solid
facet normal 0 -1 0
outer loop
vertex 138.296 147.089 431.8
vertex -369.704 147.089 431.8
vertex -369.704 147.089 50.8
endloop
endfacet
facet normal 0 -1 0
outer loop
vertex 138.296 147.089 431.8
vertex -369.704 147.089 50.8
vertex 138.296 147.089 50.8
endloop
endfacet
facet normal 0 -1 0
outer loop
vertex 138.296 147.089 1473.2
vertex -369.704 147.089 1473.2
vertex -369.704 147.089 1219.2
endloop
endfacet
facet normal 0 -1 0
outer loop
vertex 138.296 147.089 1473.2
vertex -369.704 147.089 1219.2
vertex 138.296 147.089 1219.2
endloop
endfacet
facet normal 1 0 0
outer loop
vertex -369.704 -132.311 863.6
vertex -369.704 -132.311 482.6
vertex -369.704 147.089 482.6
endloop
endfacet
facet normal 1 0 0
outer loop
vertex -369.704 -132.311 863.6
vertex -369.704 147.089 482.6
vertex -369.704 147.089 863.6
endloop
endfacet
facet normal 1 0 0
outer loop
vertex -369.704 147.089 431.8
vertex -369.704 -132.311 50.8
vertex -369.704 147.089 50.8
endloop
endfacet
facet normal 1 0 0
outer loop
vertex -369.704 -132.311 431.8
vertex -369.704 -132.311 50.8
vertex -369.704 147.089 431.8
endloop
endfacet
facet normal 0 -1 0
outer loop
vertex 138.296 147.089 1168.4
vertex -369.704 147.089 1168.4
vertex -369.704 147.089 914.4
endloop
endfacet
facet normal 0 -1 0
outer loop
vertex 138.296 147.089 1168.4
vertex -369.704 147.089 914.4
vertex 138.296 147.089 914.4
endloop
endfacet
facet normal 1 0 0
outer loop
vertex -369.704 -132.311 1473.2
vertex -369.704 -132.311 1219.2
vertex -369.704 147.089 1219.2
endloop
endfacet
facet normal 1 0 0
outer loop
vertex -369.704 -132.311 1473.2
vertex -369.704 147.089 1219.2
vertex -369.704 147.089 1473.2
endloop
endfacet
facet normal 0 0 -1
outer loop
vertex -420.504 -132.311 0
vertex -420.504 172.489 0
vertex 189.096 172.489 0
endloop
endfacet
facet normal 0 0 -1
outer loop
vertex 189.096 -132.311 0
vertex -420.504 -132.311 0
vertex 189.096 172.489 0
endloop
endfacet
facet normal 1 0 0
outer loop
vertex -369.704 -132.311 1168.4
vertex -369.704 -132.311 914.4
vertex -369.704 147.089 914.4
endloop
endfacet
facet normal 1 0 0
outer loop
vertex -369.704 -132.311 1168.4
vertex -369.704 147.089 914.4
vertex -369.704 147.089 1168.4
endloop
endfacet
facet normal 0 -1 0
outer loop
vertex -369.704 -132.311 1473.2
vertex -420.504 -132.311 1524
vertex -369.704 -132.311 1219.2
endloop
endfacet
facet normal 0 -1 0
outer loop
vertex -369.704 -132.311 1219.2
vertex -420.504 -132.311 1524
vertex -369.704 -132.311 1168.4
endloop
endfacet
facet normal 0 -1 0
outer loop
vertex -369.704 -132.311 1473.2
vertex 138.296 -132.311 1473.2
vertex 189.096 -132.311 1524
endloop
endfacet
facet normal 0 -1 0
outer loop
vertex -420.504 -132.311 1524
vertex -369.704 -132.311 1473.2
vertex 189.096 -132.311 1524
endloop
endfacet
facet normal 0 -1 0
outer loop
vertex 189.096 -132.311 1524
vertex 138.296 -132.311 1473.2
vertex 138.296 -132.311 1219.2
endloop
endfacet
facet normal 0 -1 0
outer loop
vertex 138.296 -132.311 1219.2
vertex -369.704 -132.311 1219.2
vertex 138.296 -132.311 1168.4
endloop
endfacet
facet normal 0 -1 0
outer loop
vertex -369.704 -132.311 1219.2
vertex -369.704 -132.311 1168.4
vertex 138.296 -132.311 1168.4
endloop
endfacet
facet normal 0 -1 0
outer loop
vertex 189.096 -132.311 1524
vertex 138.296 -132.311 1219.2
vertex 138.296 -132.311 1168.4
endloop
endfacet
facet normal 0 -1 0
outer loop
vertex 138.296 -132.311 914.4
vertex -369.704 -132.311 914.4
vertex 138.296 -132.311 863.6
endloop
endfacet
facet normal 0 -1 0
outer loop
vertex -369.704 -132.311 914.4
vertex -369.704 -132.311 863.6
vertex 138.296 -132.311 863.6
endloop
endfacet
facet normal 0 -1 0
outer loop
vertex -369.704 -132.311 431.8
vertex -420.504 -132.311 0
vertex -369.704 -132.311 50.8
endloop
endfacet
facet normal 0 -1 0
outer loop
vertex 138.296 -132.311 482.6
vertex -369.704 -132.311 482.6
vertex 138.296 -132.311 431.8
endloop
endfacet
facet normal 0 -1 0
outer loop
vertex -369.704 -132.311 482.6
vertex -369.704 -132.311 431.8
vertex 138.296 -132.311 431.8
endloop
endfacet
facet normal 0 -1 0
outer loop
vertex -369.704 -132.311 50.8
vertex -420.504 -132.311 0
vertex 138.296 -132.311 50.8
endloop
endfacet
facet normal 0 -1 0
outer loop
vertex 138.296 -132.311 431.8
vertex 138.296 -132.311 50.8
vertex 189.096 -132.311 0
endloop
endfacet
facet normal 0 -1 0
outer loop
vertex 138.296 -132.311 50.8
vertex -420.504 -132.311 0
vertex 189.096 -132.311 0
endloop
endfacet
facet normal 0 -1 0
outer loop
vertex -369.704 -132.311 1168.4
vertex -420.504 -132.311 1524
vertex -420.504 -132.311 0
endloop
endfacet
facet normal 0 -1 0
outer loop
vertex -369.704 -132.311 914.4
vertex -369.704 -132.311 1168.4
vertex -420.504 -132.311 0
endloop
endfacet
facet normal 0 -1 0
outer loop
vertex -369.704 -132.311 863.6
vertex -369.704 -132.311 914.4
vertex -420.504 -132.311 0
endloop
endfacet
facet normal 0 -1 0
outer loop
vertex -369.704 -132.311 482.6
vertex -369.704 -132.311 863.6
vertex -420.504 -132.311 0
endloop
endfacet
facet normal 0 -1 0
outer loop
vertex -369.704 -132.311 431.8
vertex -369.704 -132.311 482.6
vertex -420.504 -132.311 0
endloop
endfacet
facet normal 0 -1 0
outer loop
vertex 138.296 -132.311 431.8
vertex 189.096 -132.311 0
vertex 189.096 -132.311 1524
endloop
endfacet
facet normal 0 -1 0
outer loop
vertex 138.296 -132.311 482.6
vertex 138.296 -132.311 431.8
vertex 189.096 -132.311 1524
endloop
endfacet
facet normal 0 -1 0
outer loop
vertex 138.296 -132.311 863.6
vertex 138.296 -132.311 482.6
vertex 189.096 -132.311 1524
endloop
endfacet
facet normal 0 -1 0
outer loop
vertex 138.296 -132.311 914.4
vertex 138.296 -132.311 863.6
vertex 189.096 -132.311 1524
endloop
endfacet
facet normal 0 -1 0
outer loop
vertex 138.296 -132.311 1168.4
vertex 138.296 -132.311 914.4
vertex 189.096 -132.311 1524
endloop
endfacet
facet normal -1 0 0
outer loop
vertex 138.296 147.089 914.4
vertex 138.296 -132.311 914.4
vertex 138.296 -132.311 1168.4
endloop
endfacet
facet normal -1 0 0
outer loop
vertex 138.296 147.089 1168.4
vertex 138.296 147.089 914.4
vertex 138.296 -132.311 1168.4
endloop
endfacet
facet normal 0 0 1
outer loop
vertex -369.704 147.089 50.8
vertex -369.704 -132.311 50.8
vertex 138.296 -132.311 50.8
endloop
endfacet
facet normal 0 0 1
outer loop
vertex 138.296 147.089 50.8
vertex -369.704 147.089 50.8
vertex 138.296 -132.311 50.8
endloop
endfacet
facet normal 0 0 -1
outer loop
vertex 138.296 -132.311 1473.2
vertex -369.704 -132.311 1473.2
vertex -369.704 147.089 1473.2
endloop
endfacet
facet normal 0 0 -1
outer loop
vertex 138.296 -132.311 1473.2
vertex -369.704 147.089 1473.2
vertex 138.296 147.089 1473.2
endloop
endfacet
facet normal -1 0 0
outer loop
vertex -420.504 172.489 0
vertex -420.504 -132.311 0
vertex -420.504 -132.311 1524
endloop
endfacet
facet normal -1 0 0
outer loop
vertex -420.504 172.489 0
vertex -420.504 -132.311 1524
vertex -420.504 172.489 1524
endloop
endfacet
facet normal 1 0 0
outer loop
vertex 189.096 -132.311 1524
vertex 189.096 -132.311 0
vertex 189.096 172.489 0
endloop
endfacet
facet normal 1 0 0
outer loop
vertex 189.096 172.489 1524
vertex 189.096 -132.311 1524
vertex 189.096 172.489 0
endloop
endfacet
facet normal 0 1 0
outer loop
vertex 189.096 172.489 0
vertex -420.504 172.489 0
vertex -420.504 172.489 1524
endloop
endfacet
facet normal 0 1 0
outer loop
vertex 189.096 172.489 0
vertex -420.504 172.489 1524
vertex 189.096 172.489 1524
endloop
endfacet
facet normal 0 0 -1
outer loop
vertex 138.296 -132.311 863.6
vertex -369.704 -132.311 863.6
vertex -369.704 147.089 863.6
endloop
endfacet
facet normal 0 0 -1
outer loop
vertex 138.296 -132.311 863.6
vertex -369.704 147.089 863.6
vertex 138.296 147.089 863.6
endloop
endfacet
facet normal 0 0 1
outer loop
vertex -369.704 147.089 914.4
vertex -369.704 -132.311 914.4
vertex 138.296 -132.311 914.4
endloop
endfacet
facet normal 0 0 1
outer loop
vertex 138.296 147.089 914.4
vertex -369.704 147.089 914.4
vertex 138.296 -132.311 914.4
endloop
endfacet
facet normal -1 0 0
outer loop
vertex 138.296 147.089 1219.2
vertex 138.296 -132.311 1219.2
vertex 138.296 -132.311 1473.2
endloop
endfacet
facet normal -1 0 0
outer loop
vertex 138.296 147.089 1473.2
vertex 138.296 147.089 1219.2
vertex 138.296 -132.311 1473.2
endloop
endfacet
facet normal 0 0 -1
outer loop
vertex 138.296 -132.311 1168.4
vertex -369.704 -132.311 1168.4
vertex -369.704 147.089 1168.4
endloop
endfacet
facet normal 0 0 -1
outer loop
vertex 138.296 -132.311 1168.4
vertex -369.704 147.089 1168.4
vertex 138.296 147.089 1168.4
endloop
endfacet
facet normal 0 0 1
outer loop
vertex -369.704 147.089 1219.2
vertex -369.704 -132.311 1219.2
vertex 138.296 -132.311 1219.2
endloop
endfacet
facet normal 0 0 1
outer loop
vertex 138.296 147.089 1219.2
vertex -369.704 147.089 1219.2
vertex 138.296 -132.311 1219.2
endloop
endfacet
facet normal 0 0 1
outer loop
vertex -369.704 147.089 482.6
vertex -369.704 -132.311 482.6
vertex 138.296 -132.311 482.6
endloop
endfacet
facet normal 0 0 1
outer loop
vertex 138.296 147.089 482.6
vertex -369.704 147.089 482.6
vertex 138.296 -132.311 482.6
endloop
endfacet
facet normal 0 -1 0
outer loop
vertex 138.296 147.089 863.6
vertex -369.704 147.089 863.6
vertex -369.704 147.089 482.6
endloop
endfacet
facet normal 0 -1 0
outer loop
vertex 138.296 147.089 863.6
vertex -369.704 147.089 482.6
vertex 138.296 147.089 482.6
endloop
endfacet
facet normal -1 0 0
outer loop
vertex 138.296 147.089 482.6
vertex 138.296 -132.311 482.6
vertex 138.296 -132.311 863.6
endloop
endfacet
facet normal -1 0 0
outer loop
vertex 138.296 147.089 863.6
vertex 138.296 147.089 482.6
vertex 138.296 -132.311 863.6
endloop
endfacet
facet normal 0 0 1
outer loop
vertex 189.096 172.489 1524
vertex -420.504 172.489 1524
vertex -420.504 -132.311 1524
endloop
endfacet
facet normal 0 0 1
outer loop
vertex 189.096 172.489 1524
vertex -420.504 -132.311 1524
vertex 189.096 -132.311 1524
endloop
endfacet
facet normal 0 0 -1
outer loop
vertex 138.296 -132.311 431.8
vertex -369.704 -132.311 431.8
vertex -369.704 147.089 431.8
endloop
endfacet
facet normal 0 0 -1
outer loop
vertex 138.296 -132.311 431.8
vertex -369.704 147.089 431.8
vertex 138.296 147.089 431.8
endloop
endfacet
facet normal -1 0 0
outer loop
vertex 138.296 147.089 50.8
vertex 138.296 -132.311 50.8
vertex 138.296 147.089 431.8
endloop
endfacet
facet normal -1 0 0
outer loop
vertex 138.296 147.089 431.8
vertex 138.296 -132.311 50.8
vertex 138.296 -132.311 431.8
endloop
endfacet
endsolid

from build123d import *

# Parameters (mm, degrees)
F0_W     = 609.6
F0_H     = 304.8
F1_DEPTH = 1524
F2_W     = 508
F2_H     = 254
F2_H_2   = 381
F3_DEPTH = 279.4


with BuildPart() as f1:
    # F0 (on Top) → F1 (new body)
    with BuildSketch(Plane.XY):
        with Locations((-115.704429, 20.088941)):
            Rectangle(F0_W, F0_H)
    extrude(amount=F1_DEPTH)

    # F2 (on face) → F3 (cut)
    with BuildSketch(Plane.XZ.offset(132.311059)):
        with Locations((-115.704429, 1346.2)):
            Rectangle(F2_W, F2_H)
        with Locations((-115.704429, 1041.4)):
            Rectangle(F2_W, F2_H)
        with Locations((-115.704429, 673.1)):
            Rectangle(F2_W, F2_H_2)
        with Locations((-115.704429, 241.3)):
            Rectangle(F2_W, F2_H_2)
    extrude(amount=-F3_DEPTH, mode=Mode.SUBTRACT)


solid = f1.part
